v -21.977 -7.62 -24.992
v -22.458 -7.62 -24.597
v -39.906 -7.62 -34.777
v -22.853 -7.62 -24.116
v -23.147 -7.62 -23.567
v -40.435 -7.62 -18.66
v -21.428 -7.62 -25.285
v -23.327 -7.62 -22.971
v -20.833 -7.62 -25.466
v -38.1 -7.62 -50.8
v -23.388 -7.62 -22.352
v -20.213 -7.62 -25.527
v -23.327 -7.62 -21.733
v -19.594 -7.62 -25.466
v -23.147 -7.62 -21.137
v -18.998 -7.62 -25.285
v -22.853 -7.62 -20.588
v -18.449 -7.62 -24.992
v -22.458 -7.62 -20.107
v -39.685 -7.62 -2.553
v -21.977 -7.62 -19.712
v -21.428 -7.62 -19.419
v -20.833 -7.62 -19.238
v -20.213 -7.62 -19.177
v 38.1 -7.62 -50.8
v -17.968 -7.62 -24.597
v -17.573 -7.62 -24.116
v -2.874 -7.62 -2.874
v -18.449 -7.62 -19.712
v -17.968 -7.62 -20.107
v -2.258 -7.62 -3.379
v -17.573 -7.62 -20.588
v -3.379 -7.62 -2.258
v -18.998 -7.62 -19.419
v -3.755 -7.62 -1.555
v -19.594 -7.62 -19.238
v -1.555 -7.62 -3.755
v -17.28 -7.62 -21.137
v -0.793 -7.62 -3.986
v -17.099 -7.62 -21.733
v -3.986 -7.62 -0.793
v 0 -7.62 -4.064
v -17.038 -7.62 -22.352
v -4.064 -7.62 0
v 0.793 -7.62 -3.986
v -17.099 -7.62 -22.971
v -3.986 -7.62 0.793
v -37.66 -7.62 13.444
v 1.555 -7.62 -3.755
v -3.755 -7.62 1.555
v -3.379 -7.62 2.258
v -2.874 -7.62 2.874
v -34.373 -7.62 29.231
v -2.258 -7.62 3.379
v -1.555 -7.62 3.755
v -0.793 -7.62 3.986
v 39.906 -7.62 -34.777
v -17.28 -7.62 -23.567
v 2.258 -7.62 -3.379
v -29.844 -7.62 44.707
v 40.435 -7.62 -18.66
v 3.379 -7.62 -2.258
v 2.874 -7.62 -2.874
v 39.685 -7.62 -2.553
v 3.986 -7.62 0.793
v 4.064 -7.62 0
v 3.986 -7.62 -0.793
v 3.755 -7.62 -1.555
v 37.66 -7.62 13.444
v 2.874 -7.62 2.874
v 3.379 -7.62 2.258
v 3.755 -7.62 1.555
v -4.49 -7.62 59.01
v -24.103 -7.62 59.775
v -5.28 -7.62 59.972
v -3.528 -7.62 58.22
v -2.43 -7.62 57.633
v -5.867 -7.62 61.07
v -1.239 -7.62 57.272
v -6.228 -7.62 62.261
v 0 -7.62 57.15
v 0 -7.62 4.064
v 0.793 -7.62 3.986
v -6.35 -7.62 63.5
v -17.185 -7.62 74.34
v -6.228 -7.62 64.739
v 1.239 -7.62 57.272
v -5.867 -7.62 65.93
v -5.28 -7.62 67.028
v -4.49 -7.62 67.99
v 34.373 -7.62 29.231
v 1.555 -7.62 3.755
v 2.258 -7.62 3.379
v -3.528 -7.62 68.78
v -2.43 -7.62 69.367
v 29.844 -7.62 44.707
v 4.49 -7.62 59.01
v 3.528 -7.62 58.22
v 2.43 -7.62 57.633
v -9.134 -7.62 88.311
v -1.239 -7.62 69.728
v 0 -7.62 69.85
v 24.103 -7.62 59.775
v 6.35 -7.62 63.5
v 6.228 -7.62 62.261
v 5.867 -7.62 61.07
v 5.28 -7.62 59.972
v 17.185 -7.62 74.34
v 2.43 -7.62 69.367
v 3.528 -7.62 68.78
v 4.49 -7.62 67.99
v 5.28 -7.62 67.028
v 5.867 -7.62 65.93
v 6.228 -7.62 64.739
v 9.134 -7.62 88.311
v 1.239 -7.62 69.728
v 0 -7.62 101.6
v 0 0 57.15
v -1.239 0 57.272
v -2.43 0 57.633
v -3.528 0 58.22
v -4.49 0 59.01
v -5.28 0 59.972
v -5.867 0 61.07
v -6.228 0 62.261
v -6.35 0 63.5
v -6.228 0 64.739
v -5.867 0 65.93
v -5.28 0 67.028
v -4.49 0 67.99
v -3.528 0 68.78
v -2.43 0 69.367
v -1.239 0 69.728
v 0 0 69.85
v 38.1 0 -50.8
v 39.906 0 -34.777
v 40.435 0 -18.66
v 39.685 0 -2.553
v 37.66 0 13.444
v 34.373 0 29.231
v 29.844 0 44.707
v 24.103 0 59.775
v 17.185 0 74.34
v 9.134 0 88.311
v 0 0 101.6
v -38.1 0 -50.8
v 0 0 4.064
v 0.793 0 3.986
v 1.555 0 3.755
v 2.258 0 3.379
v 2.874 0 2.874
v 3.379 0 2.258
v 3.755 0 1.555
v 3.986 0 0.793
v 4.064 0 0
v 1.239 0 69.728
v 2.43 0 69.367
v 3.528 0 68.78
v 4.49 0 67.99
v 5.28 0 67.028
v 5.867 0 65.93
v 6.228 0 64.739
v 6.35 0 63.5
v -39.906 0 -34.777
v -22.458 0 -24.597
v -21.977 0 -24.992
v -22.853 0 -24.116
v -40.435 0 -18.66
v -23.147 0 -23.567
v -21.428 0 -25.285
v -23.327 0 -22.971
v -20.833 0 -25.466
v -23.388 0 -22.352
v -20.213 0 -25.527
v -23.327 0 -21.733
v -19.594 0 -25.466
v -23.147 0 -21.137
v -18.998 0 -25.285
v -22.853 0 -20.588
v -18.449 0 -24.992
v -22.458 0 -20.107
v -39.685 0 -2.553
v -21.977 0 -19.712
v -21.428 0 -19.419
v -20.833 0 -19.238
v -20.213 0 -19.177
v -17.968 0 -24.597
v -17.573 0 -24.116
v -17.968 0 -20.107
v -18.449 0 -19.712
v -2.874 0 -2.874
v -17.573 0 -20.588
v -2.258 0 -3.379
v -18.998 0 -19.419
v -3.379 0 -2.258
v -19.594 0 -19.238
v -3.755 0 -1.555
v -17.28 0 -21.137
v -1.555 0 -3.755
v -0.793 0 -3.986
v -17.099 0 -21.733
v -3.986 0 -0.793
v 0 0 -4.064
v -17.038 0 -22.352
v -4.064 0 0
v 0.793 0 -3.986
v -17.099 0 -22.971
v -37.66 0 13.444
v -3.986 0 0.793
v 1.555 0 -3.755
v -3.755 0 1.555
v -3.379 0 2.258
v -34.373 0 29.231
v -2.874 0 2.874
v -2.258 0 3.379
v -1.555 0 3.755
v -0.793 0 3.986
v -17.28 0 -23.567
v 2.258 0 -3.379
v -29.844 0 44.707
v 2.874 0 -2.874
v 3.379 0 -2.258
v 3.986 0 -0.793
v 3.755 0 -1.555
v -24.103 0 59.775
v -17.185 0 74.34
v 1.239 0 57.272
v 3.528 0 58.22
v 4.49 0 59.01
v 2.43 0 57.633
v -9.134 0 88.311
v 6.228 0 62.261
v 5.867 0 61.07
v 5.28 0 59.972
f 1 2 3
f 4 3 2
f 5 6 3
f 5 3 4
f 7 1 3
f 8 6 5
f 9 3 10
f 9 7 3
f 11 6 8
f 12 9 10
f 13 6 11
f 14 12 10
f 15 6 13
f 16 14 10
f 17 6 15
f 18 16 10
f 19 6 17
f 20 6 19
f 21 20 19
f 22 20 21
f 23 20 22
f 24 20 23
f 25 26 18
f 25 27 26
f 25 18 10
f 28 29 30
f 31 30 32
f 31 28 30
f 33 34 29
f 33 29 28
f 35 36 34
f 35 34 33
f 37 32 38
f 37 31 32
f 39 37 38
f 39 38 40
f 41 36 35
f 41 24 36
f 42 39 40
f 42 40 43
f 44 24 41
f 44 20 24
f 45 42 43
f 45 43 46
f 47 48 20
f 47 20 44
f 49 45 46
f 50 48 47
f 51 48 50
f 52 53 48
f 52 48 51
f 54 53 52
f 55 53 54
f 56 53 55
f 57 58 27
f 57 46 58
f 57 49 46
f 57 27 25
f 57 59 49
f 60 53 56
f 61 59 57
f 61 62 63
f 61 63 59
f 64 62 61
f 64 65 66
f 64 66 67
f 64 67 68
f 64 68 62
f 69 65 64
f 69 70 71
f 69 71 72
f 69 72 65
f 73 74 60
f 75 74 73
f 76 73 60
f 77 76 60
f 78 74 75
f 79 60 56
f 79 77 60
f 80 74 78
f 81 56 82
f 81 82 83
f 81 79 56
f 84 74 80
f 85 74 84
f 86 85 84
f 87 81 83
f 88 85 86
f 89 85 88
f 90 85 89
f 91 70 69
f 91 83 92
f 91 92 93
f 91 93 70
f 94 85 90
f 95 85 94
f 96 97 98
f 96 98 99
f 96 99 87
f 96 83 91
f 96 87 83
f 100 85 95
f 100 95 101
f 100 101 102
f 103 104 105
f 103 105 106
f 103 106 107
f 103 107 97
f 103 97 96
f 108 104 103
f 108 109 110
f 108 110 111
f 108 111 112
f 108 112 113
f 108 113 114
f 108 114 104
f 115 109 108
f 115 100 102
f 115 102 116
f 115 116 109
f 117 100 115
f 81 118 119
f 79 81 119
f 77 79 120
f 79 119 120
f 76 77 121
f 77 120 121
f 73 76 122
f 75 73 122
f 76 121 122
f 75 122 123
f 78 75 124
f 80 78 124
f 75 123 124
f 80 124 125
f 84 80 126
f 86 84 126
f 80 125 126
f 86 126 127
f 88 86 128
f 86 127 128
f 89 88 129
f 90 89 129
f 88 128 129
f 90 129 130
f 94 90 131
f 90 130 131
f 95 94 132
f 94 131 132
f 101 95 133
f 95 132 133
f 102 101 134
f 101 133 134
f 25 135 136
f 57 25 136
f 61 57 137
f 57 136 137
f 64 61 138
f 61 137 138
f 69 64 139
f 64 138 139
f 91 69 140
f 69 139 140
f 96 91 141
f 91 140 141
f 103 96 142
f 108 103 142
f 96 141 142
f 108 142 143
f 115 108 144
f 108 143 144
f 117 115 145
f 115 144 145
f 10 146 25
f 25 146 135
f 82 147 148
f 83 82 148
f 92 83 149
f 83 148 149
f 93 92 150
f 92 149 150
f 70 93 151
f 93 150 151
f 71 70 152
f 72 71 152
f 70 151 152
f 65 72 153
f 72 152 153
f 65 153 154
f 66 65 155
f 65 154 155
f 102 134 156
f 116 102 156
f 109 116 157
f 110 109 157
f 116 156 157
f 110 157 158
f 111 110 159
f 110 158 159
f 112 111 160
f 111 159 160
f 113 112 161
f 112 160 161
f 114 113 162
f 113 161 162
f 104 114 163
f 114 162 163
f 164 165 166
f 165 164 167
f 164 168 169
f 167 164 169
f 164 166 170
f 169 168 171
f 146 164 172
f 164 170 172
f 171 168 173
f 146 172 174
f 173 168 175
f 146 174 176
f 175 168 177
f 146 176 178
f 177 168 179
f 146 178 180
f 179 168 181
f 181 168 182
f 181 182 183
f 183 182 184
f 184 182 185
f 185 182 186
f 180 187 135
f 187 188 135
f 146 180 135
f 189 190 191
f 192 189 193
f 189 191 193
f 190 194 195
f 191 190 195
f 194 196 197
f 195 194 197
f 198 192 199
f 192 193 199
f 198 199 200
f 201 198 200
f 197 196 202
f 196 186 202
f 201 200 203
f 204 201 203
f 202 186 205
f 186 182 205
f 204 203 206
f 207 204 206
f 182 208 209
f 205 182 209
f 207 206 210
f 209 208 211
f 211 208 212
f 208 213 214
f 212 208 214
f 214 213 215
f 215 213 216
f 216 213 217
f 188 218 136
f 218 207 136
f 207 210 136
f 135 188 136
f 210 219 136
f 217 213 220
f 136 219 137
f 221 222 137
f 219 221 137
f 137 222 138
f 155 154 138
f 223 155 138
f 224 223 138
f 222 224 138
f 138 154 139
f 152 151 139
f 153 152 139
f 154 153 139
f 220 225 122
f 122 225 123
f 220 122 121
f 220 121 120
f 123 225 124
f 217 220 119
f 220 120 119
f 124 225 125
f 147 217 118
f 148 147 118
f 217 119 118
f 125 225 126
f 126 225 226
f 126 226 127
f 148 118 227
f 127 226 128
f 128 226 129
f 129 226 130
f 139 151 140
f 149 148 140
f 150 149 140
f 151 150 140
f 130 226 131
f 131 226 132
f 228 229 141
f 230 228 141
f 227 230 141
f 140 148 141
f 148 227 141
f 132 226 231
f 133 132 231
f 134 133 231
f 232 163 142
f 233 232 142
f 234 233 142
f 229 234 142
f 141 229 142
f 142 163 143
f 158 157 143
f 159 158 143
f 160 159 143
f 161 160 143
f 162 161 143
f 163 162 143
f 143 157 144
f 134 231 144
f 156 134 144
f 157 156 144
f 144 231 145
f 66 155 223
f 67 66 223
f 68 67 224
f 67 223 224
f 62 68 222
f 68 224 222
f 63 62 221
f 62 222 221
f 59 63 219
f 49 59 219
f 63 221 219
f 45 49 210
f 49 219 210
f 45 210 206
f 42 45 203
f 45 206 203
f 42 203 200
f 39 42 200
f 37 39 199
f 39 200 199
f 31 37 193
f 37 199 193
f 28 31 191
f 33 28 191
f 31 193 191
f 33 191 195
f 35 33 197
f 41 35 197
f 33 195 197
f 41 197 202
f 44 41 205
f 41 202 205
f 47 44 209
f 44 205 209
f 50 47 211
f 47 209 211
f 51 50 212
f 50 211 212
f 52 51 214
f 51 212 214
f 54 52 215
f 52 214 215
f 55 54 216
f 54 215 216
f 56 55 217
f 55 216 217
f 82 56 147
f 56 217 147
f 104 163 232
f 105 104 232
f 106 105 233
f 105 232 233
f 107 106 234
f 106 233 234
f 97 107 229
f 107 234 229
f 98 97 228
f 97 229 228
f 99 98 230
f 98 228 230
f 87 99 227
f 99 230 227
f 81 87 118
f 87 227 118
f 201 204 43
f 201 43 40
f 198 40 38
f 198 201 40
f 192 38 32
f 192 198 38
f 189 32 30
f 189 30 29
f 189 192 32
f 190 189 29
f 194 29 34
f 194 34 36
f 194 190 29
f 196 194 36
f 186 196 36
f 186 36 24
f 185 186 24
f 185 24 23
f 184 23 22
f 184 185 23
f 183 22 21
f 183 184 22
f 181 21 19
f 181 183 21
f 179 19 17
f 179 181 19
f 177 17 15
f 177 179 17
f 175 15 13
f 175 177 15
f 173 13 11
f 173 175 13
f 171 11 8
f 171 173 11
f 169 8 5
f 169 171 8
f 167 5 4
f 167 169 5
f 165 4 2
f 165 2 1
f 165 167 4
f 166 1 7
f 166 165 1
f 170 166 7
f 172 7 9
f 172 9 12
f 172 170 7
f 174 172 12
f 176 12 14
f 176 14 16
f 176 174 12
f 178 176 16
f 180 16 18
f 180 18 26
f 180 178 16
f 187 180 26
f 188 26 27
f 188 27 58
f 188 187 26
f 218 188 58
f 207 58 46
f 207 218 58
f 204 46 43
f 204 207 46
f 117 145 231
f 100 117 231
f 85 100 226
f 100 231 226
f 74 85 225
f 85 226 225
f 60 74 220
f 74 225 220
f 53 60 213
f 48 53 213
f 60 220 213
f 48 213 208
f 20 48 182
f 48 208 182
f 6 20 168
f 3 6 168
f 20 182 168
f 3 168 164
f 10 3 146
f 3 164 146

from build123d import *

# Parameters (mm, degrees)
F0_R     = 3.175
F1_DEPTH = 7.62


with BuildPart() as f1:
    # F0 (on Front) → F1 (new body)
    with BuildSketch(Plane.XZ):
        with BuildLine():
            Line((0, 69.85), (0, 101.6))
            ThreePointArc((0, 101.6), (-34.372719, 29.23068), (-38.1, -50.8))
            Line((-38.1, -50.8), (0, -50.8))
            Line((0, -50.8), (0, -4.064))
            ThreePointArc((0, -4.064), (-4.064, 0), (0, 4.064))
            Line((0, 4.064), (0, 57.15))
            ThreePointArc((0, 57.15), (-6.35, 63.5), (0, 69.85))
        make_face()
        with Locations((-20.213376, -22.352)):
            Circle(F0_R, mode=Mode.SUBTRACT)
        with BuildLine():
            ThreePointArc((38.1, -50.8), (34.372719, 29.23068), (0, 101.6))
            Line((0, 101.6), (0, 69.85))
            ThreePointArc((0, 69.85), (4.490128, 67.990128), (6.35, 63.5))
            ThreePointArc((6.35, 63.5), (4.490128, 59.009872), (0, 57.15))
            Line((0, 57.15), (0, 4.064))
            ThreePointArc((0, 4.064), (2.873682, 2.873682), (4.064, 0))
            ThreePointArc((4.064, 0), (2.873682, -2.873682), (0, -4.064))
            Line((0, -4.064), (0, -50.8))
            Line((0, -50.8), (38.1, -50.8))
        make_face()
    extrude(amount=F1_DEPTH)


solid = f1.part
